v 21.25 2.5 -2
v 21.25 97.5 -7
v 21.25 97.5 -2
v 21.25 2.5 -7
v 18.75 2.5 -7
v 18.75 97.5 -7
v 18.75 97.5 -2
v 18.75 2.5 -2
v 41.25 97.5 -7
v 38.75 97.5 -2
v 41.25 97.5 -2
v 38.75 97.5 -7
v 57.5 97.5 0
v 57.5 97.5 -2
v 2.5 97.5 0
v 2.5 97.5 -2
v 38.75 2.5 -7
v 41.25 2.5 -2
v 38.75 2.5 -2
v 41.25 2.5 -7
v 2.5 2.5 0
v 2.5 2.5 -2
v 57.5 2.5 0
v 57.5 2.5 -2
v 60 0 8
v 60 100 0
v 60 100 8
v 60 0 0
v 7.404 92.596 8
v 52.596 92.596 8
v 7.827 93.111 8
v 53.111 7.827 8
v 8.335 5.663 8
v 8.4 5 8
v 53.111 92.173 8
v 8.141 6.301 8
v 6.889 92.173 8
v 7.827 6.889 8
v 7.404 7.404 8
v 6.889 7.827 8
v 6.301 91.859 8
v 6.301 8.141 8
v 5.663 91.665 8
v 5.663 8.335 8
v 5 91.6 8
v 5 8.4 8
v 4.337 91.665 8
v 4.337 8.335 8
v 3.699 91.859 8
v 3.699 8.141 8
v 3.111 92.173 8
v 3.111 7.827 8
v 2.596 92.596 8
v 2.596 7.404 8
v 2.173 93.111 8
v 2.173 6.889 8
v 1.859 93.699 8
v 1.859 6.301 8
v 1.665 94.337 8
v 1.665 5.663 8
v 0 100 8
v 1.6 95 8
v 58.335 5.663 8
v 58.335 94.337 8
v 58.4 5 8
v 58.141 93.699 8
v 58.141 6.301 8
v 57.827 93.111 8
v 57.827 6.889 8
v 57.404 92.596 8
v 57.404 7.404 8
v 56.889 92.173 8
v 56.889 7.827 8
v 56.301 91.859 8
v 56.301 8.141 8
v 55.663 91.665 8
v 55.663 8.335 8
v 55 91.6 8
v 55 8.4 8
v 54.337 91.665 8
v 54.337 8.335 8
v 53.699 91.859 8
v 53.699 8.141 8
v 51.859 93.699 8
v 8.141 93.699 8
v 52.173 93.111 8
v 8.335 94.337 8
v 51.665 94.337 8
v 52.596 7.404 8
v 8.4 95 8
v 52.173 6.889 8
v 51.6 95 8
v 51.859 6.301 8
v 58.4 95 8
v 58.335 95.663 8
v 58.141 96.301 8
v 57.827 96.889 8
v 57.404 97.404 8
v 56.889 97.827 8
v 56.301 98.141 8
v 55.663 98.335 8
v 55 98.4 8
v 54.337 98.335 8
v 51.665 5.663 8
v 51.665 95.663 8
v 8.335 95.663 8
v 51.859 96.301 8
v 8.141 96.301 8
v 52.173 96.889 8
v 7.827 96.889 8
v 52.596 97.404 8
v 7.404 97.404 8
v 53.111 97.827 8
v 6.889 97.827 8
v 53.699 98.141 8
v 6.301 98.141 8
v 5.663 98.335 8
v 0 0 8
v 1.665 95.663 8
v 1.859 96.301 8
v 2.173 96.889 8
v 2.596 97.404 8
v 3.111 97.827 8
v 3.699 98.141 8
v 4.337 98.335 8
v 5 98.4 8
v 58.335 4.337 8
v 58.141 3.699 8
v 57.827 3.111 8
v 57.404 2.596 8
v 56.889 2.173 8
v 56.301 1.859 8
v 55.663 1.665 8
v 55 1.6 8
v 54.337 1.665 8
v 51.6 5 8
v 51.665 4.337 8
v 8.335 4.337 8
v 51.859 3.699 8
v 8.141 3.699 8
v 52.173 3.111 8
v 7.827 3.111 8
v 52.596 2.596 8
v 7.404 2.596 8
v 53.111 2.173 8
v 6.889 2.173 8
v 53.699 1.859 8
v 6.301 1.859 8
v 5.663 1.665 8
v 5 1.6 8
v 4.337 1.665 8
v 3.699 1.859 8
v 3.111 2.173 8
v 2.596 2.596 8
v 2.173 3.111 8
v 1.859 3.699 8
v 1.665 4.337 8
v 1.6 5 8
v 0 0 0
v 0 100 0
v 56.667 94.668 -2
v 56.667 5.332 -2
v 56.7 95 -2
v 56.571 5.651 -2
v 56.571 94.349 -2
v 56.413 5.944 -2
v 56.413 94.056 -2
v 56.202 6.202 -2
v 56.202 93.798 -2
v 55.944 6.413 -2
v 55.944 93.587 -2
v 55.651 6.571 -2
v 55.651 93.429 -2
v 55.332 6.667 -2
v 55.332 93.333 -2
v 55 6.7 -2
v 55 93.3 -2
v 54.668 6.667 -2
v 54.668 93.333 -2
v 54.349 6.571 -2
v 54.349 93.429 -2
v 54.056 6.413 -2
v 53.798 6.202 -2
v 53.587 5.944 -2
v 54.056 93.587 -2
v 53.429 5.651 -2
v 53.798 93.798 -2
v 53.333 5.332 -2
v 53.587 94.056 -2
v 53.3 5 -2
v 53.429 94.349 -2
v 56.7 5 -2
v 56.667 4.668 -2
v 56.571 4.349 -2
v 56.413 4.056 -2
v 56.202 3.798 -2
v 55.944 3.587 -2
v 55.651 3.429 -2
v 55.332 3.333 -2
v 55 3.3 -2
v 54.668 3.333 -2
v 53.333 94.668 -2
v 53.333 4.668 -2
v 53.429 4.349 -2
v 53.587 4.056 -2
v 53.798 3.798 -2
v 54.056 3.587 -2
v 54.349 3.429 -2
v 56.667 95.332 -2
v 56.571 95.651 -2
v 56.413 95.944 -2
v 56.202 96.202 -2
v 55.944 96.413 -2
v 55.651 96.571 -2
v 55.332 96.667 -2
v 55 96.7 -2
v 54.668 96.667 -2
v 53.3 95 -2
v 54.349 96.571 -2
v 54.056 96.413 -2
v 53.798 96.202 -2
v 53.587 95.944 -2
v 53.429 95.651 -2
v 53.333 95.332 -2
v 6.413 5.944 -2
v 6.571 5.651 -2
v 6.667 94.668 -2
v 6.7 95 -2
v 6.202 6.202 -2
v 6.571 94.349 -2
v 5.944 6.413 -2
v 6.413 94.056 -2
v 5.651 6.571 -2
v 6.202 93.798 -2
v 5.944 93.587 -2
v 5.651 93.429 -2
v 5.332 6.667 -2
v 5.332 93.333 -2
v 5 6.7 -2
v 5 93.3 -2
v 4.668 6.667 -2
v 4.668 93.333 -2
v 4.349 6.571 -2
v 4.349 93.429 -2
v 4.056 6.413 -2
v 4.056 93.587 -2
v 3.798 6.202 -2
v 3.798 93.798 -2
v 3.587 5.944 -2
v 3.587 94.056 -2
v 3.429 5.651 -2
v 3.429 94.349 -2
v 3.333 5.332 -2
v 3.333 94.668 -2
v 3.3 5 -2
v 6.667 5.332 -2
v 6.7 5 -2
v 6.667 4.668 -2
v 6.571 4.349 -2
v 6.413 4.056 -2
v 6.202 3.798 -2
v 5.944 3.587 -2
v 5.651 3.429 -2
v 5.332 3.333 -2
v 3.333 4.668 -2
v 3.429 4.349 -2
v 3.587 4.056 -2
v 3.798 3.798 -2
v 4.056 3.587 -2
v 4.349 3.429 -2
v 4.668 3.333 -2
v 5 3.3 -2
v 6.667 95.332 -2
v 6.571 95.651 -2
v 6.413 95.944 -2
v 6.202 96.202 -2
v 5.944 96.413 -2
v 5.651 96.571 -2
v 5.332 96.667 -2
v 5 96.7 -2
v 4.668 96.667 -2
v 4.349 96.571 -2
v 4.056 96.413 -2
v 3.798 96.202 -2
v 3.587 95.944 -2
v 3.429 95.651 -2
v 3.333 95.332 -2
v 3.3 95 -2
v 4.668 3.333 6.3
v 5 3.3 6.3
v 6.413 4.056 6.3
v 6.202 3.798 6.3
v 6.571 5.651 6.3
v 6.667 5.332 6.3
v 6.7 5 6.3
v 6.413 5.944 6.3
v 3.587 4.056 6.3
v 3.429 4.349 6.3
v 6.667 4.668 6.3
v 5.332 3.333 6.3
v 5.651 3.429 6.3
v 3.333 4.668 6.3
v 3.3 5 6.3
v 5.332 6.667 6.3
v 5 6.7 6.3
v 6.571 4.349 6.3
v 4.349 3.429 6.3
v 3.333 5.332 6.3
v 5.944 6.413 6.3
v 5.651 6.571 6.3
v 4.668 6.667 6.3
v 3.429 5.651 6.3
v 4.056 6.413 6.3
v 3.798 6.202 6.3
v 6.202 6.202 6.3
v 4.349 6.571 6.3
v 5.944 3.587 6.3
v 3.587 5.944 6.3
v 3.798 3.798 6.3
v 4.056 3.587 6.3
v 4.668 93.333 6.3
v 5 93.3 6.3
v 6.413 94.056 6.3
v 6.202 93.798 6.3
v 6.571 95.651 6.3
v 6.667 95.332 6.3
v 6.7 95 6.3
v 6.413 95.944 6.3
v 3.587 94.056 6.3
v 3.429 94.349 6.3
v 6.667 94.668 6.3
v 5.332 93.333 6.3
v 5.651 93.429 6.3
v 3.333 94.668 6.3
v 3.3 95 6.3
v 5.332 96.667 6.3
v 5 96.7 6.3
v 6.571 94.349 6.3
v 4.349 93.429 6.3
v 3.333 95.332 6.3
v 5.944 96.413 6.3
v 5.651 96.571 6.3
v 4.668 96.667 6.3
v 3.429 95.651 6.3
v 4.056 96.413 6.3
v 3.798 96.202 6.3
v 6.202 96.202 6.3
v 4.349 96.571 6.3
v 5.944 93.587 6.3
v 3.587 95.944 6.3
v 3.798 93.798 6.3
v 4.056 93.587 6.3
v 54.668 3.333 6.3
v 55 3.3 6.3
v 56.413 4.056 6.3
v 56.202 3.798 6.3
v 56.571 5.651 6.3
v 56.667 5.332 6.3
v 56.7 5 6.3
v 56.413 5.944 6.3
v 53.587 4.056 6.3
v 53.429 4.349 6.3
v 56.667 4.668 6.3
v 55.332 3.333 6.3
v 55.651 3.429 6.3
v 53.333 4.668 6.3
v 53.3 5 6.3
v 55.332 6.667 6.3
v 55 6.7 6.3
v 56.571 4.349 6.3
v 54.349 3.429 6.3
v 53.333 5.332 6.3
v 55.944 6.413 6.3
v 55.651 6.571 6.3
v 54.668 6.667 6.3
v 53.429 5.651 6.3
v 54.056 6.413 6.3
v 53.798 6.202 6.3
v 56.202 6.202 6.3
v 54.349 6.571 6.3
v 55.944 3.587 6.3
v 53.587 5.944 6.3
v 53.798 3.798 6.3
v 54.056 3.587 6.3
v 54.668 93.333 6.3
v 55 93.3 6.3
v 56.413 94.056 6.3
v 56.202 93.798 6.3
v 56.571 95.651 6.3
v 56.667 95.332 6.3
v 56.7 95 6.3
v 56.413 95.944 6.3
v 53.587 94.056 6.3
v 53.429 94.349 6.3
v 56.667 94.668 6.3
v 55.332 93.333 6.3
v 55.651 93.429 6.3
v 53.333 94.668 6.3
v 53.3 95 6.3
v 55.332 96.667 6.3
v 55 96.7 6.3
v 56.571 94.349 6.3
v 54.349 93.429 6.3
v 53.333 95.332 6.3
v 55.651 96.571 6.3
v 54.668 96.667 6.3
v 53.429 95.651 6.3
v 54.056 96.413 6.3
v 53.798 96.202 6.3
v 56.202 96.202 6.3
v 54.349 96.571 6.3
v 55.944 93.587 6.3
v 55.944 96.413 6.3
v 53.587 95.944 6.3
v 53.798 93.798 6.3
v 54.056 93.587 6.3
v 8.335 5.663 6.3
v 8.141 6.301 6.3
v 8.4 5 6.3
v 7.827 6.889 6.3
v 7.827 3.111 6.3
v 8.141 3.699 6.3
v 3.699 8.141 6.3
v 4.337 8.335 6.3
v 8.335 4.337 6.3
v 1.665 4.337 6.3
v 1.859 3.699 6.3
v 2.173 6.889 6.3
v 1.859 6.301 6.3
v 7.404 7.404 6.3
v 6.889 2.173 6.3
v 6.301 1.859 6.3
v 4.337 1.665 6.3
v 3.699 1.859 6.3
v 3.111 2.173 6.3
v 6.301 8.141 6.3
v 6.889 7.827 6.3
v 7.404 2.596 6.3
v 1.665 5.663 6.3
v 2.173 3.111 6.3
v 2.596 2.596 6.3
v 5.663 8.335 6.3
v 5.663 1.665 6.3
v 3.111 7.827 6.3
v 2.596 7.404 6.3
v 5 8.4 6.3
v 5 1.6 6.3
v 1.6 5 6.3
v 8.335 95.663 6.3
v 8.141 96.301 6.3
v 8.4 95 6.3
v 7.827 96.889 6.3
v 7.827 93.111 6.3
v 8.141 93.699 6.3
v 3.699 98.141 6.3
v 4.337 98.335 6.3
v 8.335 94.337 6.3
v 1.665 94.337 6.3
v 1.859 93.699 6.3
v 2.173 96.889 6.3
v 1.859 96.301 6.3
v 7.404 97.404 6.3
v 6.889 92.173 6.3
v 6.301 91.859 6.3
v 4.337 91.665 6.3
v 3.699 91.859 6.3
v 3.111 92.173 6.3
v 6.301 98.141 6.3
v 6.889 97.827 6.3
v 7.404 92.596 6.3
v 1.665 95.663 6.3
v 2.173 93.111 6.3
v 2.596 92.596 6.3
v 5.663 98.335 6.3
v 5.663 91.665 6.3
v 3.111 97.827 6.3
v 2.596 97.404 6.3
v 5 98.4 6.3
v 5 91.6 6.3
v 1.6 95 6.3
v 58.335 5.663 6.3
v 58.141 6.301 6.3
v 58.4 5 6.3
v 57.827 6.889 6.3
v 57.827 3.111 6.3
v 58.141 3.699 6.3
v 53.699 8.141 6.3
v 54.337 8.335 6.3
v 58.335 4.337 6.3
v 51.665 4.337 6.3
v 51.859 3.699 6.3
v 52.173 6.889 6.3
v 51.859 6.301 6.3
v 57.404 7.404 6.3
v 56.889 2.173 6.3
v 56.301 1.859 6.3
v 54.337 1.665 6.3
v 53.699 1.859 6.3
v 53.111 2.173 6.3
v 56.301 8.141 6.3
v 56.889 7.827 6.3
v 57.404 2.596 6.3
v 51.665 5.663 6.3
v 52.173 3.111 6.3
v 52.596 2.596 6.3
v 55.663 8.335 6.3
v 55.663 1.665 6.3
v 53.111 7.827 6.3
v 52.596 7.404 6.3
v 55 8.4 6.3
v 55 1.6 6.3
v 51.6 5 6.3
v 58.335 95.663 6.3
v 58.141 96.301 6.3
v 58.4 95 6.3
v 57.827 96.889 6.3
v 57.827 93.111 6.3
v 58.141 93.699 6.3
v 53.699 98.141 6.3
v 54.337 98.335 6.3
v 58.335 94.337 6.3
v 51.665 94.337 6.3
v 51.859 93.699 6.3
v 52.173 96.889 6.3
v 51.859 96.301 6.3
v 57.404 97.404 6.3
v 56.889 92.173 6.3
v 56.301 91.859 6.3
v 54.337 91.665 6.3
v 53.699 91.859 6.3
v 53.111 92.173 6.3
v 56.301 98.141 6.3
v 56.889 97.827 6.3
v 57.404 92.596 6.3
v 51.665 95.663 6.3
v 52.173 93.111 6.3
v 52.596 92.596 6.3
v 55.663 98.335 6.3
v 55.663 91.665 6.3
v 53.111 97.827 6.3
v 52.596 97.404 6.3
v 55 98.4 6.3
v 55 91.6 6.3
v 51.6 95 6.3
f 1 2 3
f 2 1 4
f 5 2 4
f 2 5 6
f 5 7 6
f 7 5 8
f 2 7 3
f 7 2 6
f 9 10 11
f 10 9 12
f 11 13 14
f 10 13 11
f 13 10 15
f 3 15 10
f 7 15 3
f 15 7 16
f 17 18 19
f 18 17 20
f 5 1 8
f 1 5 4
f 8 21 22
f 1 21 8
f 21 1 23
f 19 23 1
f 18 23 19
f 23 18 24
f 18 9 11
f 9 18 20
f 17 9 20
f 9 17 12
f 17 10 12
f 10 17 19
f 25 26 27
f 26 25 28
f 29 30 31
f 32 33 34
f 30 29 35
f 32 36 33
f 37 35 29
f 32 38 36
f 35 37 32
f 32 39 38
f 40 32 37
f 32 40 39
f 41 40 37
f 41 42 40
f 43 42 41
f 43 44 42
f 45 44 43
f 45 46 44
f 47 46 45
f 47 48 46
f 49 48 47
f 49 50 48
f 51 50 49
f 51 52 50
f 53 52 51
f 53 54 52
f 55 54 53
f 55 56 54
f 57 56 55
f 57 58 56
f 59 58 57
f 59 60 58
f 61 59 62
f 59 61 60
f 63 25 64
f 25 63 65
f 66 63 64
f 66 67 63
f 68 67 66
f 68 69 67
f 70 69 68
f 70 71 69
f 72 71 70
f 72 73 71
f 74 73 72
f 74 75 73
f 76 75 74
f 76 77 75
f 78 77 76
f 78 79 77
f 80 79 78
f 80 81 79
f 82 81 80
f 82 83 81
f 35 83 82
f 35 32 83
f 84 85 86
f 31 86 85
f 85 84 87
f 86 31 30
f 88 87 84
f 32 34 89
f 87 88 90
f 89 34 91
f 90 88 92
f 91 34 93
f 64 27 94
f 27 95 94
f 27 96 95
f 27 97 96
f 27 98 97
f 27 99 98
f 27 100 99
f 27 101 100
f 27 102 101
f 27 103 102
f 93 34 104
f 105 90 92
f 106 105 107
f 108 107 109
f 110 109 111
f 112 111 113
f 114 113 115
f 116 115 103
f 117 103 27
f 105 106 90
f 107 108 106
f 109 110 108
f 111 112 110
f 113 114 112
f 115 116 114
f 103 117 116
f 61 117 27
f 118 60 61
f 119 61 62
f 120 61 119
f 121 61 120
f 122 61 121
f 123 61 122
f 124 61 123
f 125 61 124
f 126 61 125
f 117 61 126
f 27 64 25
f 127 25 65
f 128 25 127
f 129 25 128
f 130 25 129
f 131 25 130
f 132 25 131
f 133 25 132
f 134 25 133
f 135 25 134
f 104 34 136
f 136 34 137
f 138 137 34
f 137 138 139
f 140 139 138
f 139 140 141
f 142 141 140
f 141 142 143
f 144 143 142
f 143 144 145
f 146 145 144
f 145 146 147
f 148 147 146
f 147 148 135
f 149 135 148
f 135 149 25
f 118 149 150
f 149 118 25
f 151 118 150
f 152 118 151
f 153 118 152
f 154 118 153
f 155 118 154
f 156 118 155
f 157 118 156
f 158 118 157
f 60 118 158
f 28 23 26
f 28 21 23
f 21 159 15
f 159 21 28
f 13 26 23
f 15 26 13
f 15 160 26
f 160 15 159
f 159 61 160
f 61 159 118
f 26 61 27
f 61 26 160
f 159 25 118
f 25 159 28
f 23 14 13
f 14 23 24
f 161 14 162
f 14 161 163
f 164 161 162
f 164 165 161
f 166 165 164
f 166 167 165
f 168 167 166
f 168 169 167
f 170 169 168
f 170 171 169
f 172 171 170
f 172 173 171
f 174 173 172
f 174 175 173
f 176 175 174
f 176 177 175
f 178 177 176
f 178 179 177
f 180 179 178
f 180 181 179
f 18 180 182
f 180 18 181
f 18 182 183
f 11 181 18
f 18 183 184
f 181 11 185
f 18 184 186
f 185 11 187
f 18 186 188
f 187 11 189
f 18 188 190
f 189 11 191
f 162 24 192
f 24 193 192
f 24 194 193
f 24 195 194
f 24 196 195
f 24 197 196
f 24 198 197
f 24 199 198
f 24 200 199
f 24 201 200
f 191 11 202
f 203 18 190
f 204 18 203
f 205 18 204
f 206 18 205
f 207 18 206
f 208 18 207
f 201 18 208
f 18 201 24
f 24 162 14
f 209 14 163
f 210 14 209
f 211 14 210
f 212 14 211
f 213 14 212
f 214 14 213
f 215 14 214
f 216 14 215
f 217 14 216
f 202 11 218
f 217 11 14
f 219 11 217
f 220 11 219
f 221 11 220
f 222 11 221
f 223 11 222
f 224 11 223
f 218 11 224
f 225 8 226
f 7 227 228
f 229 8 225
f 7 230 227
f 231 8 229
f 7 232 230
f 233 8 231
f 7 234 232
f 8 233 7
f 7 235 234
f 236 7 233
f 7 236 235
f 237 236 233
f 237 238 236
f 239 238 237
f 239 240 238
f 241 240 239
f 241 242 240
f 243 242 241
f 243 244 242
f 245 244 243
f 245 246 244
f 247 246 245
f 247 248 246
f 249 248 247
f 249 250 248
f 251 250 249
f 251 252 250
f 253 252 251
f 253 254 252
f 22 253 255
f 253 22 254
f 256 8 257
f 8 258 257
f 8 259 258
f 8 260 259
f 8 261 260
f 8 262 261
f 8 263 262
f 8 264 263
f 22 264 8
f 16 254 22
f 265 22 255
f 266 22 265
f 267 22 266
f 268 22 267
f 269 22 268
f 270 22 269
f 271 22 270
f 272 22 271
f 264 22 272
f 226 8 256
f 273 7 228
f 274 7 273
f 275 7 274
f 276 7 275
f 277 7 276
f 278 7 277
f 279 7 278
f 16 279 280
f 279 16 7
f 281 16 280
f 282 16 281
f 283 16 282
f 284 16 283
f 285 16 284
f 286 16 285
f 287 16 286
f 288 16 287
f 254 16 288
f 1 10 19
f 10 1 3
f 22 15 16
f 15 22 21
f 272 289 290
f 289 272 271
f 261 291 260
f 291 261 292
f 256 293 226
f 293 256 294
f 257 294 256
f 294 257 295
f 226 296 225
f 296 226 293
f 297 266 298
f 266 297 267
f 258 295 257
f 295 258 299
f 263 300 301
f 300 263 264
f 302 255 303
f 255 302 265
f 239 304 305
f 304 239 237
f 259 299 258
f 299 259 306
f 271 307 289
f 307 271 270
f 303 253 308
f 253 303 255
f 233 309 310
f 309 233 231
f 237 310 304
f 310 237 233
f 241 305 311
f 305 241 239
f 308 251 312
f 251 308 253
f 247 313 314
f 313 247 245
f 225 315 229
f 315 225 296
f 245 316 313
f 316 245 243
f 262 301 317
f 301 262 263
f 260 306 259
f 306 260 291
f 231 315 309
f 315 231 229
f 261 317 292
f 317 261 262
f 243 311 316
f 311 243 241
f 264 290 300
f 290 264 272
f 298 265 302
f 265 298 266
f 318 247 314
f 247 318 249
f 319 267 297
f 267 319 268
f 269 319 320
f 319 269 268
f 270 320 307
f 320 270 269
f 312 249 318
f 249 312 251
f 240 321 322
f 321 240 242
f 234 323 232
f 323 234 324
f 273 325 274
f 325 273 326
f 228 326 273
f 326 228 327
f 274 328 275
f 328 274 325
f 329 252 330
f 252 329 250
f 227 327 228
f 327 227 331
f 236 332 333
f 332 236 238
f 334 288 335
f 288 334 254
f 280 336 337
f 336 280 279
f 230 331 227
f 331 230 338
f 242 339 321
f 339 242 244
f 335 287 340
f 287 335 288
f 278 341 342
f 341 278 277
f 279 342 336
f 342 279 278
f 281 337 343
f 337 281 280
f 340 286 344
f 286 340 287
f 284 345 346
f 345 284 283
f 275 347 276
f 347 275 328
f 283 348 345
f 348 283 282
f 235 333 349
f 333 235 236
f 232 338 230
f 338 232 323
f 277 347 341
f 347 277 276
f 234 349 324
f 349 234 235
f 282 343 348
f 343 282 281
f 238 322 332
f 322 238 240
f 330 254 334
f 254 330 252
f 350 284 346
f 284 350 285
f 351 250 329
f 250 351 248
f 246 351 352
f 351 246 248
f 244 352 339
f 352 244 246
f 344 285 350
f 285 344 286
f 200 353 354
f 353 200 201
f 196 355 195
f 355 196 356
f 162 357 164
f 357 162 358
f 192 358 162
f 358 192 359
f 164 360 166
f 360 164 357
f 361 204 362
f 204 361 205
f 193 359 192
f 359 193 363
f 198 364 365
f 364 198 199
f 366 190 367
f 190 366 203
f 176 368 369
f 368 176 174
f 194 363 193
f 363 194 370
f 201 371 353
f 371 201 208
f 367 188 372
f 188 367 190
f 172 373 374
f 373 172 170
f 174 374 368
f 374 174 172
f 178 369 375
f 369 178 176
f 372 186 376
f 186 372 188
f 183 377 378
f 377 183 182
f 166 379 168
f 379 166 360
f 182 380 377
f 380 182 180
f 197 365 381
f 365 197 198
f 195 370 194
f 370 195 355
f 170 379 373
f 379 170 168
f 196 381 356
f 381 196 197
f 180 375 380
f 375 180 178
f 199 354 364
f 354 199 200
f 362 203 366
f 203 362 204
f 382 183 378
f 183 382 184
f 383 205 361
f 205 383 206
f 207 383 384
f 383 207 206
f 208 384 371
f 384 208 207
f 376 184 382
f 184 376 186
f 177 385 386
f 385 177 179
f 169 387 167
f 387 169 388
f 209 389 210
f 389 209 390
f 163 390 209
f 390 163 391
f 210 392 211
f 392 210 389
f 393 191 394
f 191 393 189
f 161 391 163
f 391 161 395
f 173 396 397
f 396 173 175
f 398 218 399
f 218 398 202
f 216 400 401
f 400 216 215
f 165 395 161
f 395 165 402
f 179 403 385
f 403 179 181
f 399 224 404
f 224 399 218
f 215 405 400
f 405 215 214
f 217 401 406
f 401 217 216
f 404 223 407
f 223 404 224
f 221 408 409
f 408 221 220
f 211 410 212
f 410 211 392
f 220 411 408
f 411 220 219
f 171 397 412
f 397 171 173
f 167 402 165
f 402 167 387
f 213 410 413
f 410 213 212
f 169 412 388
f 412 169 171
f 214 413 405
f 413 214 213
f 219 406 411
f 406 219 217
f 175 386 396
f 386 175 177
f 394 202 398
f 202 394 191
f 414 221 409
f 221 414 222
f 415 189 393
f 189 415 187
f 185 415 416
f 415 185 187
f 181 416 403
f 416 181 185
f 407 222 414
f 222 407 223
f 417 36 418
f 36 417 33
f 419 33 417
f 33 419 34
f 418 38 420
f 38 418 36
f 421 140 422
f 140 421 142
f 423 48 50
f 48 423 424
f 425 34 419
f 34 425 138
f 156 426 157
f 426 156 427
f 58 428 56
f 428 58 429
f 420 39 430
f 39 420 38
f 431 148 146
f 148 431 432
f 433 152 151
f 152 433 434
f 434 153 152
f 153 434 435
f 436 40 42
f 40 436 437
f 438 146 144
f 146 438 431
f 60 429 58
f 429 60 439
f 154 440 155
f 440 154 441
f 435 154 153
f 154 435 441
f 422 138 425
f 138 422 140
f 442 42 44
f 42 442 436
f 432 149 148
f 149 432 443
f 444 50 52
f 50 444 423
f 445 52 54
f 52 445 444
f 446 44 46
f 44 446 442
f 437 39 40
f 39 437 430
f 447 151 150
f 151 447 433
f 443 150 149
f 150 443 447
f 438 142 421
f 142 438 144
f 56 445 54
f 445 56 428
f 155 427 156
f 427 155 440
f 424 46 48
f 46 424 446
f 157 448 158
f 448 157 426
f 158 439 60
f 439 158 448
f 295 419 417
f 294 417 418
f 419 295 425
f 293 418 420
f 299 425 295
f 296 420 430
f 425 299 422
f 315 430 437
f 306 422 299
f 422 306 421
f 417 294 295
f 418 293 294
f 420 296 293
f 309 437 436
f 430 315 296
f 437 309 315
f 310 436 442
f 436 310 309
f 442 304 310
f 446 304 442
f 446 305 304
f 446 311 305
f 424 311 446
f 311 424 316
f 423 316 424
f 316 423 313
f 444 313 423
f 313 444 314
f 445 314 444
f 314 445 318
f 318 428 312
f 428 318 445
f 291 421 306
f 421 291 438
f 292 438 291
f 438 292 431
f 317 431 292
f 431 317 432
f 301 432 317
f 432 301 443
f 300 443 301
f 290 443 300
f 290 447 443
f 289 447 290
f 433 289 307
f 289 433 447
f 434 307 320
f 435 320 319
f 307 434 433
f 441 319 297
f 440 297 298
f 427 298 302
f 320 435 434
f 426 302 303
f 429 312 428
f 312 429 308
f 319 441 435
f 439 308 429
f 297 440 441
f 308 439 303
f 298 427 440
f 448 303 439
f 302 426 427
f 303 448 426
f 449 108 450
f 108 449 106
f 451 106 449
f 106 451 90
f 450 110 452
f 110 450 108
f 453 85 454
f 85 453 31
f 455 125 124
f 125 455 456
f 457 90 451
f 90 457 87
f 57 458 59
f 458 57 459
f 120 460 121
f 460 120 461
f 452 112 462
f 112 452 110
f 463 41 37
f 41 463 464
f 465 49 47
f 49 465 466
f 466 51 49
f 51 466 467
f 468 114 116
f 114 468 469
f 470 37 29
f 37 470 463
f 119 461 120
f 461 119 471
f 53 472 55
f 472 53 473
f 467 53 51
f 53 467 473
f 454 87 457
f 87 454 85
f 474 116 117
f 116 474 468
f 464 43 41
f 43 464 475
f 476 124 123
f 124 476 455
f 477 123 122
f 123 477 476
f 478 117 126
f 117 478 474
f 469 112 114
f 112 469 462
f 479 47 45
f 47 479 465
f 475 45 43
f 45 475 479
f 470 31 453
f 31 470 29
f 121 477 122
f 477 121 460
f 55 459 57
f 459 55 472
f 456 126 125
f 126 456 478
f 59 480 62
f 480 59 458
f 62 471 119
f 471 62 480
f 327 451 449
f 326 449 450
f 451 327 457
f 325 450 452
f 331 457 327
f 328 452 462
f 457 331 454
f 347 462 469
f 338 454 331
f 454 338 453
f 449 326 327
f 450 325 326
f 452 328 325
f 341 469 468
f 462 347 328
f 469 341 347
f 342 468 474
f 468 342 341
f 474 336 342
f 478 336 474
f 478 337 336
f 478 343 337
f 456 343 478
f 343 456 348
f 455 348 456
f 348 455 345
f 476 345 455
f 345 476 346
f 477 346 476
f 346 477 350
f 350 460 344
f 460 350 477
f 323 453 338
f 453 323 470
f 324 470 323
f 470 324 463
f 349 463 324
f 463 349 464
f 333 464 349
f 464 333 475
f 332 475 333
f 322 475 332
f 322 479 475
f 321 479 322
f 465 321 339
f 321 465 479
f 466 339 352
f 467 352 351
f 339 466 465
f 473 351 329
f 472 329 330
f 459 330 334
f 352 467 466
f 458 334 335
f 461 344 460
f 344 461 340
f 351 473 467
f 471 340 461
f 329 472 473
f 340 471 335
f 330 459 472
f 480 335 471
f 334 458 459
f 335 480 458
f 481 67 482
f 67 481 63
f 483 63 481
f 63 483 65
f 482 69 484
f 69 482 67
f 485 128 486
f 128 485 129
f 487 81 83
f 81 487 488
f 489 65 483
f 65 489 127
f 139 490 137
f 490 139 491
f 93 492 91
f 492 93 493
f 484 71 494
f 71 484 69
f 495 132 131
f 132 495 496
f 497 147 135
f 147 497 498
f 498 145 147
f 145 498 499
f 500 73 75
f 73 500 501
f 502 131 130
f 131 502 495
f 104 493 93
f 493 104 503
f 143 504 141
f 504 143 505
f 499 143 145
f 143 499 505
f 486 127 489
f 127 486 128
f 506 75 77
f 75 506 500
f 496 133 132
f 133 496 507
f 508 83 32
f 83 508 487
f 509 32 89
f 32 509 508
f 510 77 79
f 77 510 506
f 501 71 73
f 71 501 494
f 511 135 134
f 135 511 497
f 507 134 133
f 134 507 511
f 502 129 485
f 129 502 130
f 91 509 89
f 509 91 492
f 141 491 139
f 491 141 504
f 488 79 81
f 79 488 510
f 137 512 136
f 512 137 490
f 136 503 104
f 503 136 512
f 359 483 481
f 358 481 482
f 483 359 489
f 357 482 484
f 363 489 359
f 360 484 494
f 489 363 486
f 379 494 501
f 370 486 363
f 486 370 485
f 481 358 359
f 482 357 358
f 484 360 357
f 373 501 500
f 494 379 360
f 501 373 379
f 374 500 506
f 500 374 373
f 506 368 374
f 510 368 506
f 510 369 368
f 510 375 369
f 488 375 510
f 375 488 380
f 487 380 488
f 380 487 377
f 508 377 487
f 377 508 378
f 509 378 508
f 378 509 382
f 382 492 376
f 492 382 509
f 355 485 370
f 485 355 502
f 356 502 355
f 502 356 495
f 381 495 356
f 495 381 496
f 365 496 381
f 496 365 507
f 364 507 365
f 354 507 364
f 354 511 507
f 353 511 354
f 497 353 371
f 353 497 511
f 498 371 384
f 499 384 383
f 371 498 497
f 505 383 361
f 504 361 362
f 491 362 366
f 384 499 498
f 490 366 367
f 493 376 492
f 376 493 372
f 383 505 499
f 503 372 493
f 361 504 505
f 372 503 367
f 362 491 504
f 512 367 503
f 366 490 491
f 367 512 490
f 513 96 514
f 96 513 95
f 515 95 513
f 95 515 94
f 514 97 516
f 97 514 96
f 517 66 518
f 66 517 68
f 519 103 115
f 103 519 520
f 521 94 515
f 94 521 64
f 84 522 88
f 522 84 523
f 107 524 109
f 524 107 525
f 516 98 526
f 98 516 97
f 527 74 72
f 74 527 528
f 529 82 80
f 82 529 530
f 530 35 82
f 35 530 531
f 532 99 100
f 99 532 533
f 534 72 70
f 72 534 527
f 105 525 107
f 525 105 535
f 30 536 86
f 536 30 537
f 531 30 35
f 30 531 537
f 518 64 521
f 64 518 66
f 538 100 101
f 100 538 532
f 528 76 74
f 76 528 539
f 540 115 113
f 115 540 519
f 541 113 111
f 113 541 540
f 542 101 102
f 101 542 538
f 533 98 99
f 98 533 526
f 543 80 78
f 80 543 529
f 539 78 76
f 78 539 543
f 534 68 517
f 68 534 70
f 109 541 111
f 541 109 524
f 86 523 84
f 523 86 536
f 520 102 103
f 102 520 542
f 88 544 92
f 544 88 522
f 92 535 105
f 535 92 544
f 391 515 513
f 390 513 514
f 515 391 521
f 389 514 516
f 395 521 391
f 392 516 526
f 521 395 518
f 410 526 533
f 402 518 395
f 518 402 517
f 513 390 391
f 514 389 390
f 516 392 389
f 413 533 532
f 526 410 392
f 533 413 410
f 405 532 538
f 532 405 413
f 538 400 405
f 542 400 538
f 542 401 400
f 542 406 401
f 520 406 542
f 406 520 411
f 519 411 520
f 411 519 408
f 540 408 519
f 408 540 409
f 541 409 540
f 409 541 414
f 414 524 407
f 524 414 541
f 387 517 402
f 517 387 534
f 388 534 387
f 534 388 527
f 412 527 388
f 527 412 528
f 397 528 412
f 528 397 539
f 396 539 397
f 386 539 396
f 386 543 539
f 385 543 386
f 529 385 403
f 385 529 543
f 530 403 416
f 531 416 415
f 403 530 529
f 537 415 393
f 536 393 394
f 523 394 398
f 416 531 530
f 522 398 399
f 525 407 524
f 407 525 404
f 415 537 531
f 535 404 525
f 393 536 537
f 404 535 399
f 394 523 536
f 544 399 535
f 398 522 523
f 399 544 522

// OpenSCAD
$fn = 32;

// ----------------------------------------------------------------------
// Enclosure lid: 60 x 100 x 8 mm, 4 bolt holes
// ----------------------------------------------------------------------

// --- parameters (mm) ---
length = 60;              // lid length, X
width = 100;              // lid width, Y
plate_t = 8;              // lid plate thickness
bolt_d = 3.4;             // bolt clearance
boss_lip = 5;             // bolt hole inset from the corner
sink = 1;                 // overlap of the lip and ribs into the plate
lip_h = 3;                // lip height below the plate
lip_wall = 2.5;           // lip wall thickness
cs_d = 6.8;               // countersink diameter
cs_h = 1.7;               // countersink depth
rib_n = 2;                // stiffening ribs
rib_t = 2.5;              // rib thickness
rib_h = 8;                // rib height below the plate

module plate() {
  cube([length, width, plate_t]);
  /* lip that drops into the housing opening, sunk into the plate */
  translate([lip_wall, lip_wall, -lip_h + sink]) cube([length - 2 * lip_wall, width - 2 * lip_wall, lip_h]);
  /* stiffening ribs under the plate */
  for (i = [1 : rib_n]) translate([length * i / (rib_n + 1) - rib_t / 2, lip_wall, -rib_h + sink]) cube([rib_t, width - 2 * lip_wall, rib_h]);
}

difference() {
  plate();
  /* bolt pattern matching the corner bosses */
  for (sx = [0, 1]) for (sy = [0, 1])
    translate([sx * (length - 2 * boss_lip) + boss_lip, sy * (width - 2 * boss_lip) + boss_lip, -lip_h - 1])
      cylinder(h = plate_t + lip_h + 2, d = bolt_d);
  /* countersinks so the heads sit flush */
  for (sx = [0, 1]) for (sy = [0, 1])
    translate([sx * (length - 2 * boss_lip) + boss_lip, sy * (width - 2 * boss_lip) + boss_lip, plate_t - cs_h])
      cylinder(h = cs_h + 0.5, d = cs_d);
}
